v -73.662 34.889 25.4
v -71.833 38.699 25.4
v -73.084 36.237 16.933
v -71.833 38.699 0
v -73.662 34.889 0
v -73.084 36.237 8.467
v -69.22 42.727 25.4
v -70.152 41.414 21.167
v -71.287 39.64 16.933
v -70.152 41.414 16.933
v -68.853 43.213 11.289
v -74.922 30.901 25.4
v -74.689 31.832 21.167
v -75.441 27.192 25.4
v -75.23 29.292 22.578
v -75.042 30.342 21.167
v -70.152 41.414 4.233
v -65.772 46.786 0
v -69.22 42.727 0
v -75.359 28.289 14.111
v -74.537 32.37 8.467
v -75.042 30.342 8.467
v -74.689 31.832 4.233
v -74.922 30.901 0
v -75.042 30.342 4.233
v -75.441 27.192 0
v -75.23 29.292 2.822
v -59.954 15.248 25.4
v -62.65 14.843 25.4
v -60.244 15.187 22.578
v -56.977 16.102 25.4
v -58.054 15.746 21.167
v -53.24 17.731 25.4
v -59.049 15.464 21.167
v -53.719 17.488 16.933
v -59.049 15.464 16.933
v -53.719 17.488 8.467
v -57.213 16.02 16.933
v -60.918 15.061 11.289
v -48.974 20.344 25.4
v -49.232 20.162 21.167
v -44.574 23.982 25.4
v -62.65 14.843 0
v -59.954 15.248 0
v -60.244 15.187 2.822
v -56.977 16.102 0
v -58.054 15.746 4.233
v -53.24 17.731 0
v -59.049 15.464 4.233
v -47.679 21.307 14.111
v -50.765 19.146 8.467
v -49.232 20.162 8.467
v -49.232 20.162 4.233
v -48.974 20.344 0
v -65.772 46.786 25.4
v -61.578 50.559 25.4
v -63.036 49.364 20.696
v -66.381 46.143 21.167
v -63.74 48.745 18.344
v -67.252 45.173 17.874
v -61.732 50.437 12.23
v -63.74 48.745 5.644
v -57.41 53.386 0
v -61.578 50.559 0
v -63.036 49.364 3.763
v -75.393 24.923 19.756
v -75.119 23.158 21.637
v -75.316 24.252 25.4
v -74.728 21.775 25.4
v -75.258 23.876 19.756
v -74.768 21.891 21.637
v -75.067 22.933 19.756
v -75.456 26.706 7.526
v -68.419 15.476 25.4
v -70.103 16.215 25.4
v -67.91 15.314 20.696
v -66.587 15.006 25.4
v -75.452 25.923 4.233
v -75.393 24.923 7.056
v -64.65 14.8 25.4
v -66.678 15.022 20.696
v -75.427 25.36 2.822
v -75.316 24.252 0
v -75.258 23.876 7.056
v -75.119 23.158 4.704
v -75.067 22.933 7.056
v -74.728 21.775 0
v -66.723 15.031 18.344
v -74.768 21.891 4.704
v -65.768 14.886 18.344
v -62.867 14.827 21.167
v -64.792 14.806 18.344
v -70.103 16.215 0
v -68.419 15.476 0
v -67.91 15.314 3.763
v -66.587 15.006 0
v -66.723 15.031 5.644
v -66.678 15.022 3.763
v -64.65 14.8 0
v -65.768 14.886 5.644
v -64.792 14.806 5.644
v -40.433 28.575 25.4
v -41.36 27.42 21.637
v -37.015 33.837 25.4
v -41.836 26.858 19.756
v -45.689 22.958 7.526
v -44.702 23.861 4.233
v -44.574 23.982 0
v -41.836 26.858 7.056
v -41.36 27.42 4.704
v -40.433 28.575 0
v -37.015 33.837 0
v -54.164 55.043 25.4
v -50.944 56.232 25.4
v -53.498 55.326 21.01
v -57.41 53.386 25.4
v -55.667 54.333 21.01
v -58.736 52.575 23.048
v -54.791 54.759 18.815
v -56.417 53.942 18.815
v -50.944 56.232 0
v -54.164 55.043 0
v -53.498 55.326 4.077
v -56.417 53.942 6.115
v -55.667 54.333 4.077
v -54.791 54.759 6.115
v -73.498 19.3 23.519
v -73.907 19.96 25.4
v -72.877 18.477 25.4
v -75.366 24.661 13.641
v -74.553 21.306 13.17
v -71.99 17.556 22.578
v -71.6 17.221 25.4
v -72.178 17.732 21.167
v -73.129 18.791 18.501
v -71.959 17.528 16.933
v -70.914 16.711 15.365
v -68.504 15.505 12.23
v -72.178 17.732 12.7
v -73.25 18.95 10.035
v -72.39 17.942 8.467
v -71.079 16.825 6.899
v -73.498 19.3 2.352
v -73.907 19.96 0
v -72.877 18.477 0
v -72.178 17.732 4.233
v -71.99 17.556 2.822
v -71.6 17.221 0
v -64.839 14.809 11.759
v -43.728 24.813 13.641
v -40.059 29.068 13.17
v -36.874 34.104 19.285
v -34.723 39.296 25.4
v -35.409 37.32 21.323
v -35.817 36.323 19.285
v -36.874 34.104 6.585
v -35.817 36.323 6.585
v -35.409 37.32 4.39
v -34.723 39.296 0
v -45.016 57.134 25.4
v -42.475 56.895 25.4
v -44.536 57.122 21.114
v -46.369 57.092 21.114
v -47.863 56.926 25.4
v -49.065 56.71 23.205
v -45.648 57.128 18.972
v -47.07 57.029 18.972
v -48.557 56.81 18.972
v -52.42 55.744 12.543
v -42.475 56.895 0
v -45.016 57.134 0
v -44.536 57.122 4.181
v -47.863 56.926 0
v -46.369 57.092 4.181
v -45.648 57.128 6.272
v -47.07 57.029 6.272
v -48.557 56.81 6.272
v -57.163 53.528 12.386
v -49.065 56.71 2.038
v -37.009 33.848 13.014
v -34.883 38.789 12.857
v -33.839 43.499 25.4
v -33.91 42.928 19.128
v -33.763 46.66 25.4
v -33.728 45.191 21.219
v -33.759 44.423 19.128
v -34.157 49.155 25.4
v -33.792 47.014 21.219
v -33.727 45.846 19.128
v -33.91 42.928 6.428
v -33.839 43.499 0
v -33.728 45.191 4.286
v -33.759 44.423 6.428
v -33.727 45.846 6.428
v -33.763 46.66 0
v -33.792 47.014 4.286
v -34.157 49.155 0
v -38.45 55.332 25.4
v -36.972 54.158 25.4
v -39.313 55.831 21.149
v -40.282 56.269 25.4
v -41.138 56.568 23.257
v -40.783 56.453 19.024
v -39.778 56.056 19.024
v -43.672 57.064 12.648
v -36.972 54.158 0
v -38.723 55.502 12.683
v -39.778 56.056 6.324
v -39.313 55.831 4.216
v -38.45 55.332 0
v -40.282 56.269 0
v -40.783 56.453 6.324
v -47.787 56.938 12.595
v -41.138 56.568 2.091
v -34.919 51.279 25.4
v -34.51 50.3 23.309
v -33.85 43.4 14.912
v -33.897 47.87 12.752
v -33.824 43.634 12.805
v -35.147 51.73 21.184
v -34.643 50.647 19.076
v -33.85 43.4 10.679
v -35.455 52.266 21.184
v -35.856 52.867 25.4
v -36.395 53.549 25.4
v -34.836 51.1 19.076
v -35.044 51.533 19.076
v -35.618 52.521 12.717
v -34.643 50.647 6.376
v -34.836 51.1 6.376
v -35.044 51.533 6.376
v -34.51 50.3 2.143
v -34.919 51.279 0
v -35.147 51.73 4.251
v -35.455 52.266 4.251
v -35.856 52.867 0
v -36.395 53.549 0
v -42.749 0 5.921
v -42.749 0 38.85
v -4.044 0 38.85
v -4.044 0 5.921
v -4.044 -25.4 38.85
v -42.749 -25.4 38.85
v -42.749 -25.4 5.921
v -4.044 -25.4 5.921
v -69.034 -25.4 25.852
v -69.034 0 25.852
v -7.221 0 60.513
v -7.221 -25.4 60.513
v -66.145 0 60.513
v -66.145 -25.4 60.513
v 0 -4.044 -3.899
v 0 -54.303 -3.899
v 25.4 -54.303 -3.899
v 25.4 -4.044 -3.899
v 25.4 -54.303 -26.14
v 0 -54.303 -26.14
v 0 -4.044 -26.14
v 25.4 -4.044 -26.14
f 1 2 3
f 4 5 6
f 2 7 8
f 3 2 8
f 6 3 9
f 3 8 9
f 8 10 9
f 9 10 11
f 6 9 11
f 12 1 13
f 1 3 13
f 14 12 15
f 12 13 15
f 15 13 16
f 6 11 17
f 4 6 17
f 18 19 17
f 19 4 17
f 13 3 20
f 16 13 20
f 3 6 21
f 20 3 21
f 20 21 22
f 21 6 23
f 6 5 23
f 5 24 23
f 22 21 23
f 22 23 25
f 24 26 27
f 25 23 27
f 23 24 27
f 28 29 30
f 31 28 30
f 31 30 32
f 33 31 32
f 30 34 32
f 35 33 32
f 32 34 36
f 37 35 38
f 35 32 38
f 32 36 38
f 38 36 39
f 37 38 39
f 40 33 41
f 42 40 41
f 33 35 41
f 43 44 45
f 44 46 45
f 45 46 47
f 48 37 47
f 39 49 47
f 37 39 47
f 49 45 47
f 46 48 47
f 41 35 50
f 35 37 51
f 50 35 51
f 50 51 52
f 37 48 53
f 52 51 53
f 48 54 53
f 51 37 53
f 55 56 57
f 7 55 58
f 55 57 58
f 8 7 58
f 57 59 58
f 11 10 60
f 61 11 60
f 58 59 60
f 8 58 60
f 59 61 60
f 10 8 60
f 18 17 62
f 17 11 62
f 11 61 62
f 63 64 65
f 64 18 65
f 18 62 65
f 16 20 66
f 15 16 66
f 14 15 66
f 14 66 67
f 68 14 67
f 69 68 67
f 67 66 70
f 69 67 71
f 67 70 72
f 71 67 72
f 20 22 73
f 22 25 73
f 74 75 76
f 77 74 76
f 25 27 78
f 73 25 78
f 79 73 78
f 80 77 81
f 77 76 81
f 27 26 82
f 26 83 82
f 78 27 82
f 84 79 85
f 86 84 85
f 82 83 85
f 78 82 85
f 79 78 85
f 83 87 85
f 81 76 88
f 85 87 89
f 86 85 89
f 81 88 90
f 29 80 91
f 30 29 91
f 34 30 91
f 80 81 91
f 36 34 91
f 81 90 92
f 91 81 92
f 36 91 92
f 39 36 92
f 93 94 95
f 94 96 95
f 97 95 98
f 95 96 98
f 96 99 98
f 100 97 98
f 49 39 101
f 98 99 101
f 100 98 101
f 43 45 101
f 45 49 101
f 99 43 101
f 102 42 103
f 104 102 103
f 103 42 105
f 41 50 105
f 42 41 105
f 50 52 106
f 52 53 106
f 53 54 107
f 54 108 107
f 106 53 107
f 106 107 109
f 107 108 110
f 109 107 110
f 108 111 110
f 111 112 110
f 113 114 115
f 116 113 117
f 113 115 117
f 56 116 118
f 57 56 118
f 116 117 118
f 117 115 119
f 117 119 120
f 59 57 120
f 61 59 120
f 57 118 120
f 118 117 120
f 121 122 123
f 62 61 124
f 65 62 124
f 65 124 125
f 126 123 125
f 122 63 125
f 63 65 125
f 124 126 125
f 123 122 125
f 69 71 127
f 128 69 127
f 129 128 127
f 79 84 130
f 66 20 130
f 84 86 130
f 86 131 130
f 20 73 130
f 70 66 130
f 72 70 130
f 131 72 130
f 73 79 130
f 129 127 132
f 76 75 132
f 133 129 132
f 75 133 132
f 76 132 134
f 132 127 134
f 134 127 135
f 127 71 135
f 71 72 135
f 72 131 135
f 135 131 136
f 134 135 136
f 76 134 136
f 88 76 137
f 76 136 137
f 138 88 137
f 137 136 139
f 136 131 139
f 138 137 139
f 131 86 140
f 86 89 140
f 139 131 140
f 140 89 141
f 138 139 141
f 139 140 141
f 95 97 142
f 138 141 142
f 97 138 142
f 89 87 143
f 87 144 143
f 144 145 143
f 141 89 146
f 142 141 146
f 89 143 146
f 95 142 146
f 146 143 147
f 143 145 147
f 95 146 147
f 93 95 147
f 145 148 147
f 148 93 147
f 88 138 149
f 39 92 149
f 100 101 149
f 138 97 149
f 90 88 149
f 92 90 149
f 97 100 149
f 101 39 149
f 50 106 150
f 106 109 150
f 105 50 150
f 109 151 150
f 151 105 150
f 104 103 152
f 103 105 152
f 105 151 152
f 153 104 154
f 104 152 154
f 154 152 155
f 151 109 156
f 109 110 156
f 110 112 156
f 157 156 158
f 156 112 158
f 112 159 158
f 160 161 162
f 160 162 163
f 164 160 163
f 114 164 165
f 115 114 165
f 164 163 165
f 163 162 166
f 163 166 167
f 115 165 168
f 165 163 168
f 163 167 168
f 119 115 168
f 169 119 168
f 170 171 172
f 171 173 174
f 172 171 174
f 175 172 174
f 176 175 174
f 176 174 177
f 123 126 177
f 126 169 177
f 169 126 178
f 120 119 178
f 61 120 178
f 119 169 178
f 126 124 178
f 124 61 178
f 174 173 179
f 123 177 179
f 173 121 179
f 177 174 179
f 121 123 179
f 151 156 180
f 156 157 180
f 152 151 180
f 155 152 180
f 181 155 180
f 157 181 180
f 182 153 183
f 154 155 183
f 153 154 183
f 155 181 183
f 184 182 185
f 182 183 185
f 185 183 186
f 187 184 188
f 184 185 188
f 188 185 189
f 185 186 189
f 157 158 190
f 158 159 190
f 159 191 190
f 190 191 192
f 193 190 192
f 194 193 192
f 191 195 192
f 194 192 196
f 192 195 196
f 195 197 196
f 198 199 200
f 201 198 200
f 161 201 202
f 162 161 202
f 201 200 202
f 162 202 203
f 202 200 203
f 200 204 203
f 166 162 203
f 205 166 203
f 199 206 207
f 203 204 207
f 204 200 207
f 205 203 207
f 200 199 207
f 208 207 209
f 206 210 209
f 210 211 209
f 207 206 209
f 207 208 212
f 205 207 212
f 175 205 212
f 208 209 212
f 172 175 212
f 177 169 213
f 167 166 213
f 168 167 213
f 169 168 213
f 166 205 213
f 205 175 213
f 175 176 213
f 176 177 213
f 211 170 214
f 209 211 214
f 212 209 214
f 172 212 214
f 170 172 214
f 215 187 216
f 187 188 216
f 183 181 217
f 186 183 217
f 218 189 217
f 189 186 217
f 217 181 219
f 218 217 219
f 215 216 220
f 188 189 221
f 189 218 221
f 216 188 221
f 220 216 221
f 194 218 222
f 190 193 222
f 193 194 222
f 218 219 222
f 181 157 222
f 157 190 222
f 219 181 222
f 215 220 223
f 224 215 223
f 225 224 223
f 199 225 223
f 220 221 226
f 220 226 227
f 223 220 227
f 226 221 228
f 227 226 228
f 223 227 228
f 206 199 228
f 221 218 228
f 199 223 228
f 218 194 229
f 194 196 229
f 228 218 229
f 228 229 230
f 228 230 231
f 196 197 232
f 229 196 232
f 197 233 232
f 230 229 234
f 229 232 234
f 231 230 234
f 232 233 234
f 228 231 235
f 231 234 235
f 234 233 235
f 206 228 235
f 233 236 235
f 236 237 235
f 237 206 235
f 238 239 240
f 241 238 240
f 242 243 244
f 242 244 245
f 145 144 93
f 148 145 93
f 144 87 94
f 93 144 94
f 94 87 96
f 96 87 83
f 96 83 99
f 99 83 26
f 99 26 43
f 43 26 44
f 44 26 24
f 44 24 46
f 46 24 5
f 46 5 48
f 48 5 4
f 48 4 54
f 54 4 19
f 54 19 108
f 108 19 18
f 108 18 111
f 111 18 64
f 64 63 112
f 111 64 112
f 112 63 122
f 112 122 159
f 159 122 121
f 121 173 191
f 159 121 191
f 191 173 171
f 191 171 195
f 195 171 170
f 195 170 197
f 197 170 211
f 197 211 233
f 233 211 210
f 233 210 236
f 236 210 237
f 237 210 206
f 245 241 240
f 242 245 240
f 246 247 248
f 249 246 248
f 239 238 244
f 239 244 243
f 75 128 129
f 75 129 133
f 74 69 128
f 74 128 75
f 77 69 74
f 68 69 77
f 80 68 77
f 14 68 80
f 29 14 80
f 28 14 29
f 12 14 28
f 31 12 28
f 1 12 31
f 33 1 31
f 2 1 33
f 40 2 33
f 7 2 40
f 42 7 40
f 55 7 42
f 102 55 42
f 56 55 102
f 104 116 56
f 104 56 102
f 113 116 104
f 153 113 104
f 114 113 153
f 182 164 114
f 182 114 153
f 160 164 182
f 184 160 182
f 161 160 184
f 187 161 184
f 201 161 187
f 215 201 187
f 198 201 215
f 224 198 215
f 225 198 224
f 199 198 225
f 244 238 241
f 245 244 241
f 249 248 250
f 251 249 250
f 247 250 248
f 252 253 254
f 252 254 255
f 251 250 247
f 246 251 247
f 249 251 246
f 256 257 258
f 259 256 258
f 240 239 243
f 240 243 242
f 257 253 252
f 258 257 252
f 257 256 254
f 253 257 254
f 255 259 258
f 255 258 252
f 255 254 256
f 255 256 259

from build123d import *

# Parameters (mm, degrees)
F0_W     = 38.705198
F0_H     = 32.928304
F2_DEPTH = 25.4
F3_DEPTH = 25.4
F4_W     = 50.258988
F4_H     = 22.241049
F5_DEPTH = 25.4
F7_DEPTH = 25.4


with BuildPart() as f2:
    # F0 (on Front) → F2 (new body)
    with BuildSketch(Plane.XZ):
        with Locations((-23.396426, 22.38547)):
            Rectangle(F0_W, F0_H)
    extrude(amount=F2_DEPTH)


with BuildPart() as f3:
    # F1 (on Front) → F3 (new body)
    with BuildSketch(Plane.XZ):
        Polygon((-66.14545, 60.512979), (-69.033898, 25.851605), (-7.221117, 60.512979), align=None)
    extrude(amount=F3_DEPTH)


with BuildPart() as f5:
    # F4 (on Right) → F5 (new body)
    with BuildSketch(Plane.YZ):
        with Locations((-29.173321, -15.019928)):
            Rectangle(F4_W, F4_H)
    extrude(amount=F5_DEPTH)


with BuildPart() as f7:
    # F6 (on Top) → F7 (new body)
    with BuildSketch(Plane.XY):
        with BuildLine():
            add(Edge.make_bspline(
                [(-36.972132, 54.158397), (-56.336354, 72.907875), (-73.083534, 36.237301), (-89.830715, -0.433274), (-53.719312, 17.487823), (-17.60791, 35.408919), (-36.972132, 54.158397)],
                knots=[0, 0, 0, 2.094395, 2.094395, 4.18879, 4.18879, 6.283185, 6.283185, 6.283185], degree=2, weights=[1, 0.5, 1, 0.5, 1, 0.5, 1]))
        make_face()
    extrude(amount=F7_DEPTH)


solid = Compound([f2.part, f3.part, f5.part, f7.part])
